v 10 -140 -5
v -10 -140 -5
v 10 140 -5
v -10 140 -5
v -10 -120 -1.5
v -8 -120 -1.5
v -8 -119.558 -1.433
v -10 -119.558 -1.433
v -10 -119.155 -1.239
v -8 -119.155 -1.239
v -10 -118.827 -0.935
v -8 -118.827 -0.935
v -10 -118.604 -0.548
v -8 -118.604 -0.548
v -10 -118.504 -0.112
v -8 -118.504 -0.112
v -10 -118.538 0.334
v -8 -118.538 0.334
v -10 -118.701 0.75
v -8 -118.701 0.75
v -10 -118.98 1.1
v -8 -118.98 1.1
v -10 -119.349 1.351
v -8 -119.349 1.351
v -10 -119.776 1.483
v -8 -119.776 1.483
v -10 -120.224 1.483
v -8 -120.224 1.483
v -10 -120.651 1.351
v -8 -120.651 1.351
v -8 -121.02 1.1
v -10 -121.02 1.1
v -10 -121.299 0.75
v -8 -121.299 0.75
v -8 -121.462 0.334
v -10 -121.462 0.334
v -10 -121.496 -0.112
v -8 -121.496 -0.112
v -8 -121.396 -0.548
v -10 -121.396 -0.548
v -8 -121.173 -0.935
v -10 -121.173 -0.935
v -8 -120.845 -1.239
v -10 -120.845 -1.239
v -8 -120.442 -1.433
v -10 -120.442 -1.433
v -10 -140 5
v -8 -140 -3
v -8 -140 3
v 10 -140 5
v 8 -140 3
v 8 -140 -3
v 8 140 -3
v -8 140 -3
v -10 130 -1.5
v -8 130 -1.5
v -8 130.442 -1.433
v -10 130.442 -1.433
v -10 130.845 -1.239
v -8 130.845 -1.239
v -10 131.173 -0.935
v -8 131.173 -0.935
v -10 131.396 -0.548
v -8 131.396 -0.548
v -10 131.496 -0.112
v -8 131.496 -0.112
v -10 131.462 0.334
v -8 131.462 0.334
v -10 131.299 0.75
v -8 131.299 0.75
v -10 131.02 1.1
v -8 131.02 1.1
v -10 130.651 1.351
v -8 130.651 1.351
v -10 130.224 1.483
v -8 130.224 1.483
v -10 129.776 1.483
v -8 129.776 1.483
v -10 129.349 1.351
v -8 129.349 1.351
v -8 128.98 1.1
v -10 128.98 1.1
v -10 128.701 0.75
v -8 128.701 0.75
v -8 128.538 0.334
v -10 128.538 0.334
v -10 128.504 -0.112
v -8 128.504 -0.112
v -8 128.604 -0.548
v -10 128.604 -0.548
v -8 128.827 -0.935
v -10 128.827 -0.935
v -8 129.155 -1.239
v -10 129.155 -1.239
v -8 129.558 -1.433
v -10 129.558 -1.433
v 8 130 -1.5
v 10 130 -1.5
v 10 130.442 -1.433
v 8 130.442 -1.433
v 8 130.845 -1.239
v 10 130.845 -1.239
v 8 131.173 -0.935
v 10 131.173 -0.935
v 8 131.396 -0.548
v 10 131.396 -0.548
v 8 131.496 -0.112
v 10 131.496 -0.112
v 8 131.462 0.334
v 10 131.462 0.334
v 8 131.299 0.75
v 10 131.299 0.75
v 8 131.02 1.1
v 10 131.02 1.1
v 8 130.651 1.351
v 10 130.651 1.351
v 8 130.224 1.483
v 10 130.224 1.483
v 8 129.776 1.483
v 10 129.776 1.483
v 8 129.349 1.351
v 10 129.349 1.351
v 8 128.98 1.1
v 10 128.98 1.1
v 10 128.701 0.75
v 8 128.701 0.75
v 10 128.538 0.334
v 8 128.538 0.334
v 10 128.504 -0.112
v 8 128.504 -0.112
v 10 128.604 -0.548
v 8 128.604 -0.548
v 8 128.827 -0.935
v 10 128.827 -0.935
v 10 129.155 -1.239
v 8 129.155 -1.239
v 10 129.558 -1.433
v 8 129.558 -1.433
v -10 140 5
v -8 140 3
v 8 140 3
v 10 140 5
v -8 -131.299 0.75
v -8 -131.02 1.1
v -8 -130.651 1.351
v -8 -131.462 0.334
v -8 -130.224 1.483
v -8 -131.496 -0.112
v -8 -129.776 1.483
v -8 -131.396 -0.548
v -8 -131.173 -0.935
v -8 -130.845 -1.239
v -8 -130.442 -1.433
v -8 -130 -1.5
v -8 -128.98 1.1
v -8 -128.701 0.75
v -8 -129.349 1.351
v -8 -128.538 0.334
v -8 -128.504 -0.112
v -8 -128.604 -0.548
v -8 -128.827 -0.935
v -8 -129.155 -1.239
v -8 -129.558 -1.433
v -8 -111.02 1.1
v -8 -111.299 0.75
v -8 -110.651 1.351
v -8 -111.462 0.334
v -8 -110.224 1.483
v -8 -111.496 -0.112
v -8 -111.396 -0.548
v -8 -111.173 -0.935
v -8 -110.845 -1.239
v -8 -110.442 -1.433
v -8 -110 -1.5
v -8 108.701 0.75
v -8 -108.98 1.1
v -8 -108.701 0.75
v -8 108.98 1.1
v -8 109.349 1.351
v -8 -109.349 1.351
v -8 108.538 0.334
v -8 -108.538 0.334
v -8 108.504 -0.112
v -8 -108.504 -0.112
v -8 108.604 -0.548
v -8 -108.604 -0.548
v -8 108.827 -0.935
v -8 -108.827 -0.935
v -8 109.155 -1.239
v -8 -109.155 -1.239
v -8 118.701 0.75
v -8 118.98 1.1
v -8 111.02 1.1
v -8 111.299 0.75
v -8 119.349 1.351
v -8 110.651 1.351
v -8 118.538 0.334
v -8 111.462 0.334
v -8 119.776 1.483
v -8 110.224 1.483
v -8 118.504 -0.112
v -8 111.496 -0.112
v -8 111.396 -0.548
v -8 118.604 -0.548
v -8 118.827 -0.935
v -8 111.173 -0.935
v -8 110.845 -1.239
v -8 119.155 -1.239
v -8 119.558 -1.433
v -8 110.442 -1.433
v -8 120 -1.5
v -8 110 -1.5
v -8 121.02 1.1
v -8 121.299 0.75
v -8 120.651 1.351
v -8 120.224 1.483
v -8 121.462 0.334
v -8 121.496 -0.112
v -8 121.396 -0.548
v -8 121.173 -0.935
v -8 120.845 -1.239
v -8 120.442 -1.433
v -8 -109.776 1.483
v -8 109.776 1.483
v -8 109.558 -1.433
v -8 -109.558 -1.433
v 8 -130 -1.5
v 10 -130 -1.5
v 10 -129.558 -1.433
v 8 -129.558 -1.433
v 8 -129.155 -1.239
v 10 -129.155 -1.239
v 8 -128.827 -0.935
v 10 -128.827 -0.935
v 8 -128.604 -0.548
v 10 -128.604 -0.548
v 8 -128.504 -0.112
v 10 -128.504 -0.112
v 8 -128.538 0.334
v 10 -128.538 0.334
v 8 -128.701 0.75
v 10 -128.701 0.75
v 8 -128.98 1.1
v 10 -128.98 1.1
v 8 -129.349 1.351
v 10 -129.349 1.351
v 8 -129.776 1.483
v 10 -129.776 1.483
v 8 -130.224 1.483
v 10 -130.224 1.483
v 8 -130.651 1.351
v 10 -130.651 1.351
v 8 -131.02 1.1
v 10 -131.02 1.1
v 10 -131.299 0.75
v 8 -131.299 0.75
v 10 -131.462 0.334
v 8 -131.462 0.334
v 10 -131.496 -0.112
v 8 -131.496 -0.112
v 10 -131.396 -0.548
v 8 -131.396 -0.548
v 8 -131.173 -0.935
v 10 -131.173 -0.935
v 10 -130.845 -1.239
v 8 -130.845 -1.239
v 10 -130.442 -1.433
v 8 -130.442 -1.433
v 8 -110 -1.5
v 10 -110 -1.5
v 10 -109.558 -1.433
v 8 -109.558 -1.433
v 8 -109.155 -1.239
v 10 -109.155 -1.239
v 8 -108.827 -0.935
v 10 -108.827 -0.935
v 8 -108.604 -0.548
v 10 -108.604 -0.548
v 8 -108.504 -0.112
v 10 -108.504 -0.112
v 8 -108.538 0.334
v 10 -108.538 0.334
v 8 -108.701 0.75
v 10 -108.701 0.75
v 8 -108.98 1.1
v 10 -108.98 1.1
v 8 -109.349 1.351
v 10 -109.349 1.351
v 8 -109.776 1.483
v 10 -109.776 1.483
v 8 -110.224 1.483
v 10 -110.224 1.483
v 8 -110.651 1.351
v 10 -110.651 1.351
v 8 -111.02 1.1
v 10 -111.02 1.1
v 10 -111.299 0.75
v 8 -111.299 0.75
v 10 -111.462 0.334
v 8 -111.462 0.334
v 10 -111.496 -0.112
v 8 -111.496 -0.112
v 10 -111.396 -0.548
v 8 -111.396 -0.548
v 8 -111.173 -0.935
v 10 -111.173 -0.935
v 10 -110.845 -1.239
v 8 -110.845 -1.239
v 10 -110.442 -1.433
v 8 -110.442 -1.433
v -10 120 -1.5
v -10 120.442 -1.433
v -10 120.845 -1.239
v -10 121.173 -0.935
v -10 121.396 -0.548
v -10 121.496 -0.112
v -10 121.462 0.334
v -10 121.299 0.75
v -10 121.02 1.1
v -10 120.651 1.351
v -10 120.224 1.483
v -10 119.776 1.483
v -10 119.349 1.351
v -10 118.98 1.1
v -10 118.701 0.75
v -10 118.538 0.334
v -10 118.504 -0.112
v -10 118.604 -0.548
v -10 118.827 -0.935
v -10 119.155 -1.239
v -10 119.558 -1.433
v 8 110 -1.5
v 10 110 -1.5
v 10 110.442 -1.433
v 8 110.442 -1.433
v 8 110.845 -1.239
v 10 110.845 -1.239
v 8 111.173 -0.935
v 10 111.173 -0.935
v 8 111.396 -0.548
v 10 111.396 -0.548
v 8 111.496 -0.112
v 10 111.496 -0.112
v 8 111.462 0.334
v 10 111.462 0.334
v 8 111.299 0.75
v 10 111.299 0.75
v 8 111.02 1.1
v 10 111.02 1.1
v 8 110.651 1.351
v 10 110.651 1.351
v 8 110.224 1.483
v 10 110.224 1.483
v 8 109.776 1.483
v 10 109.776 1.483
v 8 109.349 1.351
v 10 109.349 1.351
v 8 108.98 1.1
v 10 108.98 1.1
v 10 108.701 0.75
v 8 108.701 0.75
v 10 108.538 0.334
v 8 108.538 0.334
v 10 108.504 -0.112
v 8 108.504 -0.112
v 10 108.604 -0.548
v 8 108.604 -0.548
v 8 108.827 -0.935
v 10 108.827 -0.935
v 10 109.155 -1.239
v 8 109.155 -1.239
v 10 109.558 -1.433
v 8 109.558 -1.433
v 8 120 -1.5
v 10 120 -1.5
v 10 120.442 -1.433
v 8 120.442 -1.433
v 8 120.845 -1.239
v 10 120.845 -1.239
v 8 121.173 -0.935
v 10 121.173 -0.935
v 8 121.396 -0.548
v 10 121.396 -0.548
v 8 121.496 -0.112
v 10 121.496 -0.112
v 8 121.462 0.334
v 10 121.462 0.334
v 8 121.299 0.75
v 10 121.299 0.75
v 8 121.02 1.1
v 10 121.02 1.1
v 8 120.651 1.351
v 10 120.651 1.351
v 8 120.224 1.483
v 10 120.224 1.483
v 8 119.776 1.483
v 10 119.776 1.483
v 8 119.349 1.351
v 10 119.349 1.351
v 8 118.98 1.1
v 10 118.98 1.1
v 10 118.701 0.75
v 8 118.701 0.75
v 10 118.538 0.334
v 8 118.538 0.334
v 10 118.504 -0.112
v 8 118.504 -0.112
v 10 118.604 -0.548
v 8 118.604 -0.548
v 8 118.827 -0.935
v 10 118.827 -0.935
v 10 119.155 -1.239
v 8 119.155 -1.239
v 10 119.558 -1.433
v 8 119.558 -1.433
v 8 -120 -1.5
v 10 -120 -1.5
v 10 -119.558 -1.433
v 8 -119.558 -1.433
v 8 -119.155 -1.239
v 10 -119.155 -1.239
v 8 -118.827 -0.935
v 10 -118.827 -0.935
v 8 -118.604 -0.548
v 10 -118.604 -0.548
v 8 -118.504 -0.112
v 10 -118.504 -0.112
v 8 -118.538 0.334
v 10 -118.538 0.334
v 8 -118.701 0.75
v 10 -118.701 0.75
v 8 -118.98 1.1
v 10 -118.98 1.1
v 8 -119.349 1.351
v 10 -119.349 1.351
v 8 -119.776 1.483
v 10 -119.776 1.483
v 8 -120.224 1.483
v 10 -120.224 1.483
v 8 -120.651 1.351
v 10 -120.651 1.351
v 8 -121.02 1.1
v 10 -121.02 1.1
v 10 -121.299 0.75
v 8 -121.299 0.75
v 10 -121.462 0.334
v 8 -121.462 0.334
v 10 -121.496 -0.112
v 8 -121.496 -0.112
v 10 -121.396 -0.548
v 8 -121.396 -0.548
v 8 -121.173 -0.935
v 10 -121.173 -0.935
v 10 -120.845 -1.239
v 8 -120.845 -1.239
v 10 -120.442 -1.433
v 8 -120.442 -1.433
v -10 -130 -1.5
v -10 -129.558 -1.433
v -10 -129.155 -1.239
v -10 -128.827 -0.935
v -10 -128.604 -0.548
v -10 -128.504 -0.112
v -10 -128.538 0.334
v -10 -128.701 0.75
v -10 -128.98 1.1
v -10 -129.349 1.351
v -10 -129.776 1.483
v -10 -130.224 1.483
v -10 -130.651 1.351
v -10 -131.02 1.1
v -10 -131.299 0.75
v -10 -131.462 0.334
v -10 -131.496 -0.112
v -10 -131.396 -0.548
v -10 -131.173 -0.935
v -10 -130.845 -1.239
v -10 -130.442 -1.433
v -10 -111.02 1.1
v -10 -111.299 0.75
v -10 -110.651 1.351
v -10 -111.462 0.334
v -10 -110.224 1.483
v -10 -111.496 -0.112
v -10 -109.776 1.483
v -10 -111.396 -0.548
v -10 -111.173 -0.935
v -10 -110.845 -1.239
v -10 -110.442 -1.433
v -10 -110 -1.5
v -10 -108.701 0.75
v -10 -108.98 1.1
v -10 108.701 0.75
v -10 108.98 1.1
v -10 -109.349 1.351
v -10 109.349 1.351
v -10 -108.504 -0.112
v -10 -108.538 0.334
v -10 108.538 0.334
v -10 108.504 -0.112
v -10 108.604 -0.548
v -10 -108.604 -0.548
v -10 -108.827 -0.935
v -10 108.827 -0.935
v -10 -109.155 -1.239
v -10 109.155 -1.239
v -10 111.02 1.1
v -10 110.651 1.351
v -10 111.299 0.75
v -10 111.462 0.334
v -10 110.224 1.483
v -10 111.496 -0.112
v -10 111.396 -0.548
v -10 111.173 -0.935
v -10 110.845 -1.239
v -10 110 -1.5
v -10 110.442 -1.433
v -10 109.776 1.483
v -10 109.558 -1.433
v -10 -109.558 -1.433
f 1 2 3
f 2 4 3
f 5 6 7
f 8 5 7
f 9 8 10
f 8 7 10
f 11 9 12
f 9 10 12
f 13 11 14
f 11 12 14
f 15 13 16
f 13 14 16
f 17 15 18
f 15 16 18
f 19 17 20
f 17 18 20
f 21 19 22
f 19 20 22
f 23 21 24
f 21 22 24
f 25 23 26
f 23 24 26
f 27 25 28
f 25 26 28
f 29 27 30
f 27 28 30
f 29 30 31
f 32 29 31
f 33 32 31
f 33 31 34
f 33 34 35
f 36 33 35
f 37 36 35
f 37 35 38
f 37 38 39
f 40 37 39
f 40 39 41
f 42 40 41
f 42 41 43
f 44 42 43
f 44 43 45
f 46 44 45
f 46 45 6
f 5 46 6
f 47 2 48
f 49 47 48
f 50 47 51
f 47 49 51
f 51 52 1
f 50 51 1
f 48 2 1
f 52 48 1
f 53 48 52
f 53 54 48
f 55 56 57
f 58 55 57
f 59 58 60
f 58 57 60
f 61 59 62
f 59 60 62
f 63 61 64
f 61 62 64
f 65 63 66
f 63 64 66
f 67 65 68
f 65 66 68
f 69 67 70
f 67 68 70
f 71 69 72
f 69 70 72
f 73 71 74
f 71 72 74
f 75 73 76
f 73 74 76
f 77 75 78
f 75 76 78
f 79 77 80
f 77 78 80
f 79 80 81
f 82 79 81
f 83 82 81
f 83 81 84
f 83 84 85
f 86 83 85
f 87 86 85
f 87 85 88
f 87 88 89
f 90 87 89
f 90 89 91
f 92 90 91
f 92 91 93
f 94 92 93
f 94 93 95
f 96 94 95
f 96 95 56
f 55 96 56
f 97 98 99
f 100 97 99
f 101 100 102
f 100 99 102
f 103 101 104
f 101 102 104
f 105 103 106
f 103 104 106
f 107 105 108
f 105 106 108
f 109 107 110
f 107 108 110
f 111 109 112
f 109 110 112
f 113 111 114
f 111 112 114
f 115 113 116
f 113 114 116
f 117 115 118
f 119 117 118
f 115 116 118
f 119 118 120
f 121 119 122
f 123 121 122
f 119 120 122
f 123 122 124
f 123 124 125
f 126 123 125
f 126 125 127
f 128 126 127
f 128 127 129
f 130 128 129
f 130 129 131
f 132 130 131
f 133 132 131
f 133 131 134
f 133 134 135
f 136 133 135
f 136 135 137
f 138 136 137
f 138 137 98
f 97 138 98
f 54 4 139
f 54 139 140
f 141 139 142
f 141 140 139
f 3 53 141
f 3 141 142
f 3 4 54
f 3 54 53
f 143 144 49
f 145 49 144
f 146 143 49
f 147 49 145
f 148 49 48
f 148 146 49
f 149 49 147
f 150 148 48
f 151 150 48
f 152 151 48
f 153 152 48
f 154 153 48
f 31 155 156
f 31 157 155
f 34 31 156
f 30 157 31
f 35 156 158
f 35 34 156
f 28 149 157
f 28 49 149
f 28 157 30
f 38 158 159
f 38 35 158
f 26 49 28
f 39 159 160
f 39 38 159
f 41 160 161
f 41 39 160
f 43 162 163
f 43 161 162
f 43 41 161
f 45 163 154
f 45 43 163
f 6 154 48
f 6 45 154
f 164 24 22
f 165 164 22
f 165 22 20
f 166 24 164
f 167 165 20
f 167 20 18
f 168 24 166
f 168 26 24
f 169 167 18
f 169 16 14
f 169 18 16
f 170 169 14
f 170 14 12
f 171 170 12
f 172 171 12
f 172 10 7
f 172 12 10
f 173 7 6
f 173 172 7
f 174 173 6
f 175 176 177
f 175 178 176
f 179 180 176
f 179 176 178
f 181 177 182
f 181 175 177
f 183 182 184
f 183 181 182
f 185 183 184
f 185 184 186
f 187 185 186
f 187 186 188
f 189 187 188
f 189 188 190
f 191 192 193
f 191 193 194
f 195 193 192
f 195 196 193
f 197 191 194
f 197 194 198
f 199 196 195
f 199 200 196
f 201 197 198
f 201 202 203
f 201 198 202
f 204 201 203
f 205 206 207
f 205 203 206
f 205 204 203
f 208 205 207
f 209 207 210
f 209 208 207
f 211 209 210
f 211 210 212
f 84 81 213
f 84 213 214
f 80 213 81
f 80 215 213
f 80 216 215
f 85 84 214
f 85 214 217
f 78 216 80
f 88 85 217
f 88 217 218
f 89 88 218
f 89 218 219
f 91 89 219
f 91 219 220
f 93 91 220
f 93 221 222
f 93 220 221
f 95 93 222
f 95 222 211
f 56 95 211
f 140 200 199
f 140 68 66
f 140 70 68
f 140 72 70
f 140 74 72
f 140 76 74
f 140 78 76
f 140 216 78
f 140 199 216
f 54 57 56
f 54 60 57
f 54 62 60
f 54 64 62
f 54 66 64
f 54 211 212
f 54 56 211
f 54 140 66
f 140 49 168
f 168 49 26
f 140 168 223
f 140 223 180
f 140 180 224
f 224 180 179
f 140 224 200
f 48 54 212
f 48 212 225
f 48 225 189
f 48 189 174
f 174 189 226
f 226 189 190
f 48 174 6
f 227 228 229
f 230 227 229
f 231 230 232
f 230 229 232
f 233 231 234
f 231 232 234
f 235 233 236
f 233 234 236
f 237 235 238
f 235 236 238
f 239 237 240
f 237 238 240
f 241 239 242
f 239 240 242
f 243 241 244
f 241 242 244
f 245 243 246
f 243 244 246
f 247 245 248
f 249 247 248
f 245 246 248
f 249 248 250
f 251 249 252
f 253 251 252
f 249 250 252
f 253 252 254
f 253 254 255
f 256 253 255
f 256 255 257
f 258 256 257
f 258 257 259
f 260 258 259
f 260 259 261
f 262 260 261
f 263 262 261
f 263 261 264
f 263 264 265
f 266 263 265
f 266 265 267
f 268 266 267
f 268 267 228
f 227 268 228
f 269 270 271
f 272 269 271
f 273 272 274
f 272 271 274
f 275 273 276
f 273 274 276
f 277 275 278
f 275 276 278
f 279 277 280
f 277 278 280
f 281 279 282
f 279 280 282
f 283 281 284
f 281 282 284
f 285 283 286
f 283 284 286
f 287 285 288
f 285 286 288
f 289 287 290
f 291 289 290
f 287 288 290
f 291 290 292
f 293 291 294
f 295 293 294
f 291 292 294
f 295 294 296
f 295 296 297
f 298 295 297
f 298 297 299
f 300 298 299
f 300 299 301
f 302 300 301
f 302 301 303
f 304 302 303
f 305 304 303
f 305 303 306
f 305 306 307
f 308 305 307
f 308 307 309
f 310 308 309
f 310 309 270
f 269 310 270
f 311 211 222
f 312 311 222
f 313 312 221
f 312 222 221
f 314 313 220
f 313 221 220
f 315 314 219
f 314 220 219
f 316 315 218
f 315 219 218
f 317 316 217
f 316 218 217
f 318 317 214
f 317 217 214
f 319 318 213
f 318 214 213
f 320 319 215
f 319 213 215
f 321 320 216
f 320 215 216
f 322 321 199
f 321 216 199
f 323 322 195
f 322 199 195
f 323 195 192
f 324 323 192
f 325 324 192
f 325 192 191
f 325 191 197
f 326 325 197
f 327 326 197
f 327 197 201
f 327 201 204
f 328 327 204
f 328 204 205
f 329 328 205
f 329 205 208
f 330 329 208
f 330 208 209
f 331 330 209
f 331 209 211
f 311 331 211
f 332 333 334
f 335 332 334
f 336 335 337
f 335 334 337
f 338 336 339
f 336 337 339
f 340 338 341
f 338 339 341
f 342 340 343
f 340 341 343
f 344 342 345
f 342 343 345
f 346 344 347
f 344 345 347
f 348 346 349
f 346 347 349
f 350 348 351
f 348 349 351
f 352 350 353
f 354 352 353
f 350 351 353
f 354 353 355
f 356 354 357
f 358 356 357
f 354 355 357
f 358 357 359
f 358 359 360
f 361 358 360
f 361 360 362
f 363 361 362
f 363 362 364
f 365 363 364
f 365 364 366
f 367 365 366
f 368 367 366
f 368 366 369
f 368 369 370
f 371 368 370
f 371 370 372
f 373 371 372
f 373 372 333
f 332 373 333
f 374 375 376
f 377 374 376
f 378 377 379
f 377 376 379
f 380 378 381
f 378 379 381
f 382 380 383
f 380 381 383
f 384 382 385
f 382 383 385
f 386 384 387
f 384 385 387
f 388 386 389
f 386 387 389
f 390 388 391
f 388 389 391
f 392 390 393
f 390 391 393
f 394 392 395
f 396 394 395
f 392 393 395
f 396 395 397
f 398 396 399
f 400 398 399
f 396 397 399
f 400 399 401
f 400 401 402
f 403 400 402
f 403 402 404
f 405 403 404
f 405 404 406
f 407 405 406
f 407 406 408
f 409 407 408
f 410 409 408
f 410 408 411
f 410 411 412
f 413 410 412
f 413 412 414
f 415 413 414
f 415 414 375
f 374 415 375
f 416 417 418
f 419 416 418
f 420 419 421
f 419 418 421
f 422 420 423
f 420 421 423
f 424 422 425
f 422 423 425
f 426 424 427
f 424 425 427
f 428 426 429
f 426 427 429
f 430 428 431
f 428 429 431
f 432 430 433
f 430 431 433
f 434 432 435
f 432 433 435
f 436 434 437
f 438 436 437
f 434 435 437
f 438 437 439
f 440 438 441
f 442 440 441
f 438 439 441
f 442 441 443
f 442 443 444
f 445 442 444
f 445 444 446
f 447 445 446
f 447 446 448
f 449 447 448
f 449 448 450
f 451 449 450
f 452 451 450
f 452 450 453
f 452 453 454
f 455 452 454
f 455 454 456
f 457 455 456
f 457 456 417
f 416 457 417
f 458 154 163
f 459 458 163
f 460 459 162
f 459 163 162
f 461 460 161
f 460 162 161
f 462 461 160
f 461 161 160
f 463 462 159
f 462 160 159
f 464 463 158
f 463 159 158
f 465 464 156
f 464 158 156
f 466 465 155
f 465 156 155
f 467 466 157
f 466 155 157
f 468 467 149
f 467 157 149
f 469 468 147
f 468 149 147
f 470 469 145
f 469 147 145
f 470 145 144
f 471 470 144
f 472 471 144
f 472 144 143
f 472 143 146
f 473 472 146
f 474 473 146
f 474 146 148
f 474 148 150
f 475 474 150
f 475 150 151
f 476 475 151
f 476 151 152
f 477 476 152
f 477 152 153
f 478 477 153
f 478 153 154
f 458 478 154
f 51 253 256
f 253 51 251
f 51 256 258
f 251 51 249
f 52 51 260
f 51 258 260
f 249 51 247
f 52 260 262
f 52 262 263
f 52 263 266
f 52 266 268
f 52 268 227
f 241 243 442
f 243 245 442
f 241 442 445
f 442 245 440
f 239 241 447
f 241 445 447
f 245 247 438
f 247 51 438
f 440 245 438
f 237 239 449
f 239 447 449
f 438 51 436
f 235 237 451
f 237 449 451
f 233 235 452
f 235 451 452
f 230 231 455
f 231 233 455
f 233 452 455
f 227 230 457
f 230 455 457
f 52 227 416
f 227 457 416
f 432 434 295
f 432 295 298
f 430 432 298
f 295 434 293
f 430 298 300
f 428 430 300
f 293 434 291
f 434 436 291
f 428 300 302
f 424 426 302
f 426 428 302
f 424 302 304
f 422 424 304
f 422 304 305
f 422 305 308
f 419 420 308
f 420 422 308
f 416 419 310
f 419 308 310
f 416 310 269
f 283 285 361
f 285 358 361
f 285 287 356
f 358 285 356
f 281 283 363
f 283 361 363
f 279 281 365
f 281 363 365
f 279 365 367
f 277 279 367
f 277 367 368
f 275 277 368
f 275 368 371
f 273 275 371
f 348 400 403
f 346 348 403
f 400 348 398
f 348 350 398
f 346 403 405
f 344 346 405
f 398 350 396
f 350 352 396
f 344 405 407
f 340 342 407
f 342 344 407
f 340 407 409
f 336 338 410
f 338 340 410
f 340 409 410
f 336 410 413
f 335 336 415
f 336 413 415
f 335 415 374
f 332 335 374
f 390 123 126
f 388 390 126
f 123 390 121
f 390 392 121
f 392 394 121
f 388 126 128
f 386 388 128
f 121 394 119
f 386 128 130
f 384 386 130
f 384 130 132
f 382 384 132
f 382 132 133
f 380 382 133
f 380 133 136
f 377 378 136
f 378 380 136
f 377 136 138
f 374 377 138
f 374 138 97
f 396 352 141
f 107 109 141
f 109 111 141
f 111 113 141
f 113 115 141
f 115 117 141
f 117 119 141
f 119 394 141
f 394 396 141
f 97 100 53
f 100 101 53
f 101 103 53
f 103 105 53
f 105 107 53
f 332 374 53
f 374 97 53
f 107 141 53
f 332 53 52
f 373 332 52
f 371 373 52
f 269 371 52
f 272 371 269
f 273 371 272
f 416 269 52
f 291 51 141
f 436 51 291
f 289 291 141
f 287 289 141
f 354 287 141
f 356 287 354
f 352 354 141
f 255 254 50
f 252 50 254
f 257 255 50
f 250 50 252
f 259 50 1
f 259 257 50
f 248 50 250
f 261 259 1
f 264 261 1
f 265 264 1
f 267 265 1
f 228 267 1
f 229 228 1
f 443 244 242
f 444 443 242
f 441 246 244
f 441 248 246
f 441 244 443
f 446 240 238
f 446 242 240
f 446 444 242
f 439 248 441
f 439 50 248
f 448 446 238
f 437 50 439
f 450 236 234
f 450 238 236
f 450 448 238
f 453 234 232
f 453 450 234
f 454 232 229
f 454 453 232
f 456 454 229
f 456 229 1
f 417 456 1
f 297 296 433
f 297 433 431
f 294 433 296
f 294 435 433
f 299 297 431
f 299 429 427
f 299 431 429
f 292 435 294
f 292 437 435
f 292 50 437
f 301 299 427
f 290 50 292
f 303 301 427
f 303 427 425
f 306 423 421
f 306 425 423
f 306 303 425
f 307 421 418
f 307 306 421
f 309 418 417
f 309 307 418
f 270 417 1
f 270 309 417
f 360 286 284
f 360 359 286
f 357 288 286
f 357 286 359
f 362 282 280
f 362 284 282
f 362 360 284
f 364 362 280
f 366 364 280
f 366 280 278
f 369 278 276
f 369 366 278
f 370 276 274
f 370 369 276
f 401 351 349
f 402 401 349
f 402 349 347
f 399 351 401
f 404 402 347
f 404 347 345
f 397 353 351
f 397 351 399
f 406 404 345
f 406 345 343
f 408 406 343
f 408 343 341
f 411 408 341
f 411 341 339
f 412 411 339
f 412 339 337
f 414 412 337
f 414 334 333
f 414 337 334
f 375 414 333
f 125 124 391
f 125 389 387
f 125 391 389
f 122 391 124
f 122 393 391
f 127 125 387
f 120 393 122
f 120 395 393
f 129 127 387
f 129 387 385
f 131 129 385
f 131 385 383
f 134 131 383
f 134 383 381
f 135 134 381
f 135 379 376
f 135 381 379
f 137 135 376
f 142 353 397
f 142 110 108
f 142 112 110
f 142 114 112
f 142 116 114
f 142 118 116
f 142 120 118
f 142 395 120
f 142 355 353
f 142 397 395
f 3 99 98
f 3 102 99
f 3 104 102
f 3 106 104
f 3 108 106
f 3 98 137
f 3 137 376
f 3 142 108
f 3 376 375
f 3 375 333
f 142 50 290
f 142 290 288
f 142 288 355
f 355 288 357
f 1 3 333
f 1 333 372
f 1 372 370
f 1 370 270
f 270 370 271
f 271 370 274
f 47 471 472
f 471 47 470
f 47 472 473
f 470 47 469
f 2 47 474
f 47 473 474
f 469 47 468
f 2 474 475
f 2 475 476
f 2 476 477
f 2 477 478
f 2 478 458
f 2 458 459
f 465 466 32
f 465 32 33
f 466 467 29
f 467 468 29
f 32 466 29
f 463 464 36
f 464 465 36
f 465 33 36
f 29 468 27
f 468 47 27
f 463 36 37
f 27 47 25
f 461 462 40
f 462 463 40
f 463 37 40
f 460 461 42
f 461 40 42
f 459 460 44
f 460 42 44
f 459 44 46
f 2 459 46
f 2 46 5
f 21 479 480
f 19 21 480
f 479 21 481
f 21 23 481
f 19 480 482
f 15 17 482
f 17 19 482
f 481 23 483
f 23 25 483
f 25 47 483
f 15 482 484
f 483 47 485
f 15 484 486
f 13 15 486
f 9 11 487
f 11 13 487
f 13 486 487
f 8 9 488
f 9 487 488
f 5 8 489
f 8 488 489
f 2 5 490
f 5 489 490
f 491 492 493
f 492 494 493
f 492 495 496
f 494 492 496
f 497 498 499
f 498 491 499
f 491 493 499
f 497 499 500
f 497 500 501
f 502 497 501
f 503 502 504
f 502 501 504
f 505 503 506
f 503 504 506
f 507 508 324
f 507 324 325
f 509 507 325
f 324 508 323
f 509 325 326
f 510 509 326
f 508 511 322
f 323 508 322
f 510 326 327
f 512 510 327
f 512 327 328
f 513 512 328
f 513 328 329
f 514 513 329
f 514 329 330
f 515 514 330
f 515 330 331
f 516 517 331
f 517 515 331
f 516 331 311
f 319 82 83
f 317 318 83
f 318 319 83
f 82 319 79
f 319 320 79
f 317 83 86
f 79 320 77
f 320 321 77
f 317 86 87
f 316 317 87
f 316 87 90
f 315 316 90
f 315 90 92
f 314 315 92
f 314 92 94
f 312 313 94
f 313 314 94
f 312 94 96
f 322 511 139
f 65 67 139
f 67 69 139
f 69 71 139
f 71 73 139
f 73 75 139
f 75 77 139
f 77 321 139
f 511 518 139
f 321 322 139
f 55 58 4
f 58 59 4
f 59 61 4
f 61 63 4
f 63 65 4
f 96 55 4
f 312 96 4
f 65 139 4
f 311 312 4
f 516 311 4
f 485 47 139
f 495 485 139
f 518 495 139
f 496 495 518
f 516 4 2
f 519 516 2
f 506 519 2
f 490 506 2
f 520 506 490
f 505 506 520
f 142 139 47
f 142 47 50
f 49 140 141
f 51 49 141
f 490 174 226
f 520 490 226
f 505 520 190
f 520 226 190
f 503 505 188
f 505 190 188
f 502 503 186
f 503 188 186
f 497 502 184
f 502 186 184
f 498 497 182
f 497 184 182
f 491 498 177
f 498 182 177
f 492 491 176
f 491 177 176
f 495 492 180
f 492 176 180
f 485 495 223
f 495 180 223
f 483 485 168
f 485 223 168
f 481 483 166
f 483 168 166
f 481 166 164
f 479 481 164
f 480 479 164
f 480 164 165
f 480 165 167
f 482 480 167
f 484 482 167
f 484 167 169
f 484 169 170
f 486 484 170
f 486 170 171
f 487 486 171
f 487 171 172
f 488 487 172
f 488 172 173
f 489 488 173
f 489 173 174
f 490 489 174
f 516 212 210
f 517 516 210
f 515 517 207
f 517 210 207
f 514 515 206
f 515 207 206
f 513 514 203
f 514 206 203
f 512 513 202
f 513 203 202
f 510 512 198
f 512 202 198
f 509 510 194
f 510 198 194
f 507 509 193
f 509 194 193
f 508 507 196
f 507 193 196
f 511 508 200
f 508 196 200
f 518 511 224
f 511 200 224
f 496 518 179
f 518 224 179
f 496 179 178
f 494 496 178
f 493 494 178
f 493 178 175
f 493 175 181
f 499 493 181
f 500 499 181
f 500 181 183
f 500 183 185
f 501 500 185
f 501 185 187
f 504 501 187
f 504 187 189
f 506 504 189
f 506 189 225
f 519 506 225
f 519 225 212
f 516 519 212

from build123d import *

# Parameters (mm, degrees)
SKETCH_1_W          = 20
SKETCH_1_H          = 10
SKETCH_1_W_2        = 16
SKETCH_1_H_2        = 6
EXTRUDE_1_DEPTH     = 140
SKETCH_3_R          = 1.5
CUT_EXTRUDE_1_DEPTH = 142.509716981


with BuildPart() as part:
    # 草图1 → 凸台-拉伸1 (new, symmetric)
    with BuildSketch(Plane(origin=(0, 0, 0), x_dir=(1, 0, 0), z_dir=(0, 1, 0))):
        Rectangle(SKETCH_1_W, SKETCH_1_H)
        Rectangle(SKETCH_1_W_2, SKETCH_1_H_2, mode=Mode.SUBTRACT)
    extrude(amount=EXTRUDE_1_DEPTH, both=True)

    # 草图3 → 切除-拉伸1 (cut, through all)
    with BuildSketch(Plane(origin=(10, 0, 0), x_dir=(0, 0, -1), z_dir=(1, 0, 0))):
        with Locations((0, 130)):
            Circle(SKETCH_3_R)
        with Locations((0, 120)):
            Circle(SKETCH_3_R)
        with Locations((0, 110)):
            Circle(SKETCH_3_R)
        with Locations((0, -110)):
            Circle(SKETCH_3_R)
        with Locations((0, -120)):
            Circle(SKETCH_3_R)
        with Locations((0, -130)):
            Circle(SKETCH_3_R)
    extrude(amount=-CUT_EXTRUDE_1_DEPTH, mode=Mode.SUBTRACT)


solid = part.part
